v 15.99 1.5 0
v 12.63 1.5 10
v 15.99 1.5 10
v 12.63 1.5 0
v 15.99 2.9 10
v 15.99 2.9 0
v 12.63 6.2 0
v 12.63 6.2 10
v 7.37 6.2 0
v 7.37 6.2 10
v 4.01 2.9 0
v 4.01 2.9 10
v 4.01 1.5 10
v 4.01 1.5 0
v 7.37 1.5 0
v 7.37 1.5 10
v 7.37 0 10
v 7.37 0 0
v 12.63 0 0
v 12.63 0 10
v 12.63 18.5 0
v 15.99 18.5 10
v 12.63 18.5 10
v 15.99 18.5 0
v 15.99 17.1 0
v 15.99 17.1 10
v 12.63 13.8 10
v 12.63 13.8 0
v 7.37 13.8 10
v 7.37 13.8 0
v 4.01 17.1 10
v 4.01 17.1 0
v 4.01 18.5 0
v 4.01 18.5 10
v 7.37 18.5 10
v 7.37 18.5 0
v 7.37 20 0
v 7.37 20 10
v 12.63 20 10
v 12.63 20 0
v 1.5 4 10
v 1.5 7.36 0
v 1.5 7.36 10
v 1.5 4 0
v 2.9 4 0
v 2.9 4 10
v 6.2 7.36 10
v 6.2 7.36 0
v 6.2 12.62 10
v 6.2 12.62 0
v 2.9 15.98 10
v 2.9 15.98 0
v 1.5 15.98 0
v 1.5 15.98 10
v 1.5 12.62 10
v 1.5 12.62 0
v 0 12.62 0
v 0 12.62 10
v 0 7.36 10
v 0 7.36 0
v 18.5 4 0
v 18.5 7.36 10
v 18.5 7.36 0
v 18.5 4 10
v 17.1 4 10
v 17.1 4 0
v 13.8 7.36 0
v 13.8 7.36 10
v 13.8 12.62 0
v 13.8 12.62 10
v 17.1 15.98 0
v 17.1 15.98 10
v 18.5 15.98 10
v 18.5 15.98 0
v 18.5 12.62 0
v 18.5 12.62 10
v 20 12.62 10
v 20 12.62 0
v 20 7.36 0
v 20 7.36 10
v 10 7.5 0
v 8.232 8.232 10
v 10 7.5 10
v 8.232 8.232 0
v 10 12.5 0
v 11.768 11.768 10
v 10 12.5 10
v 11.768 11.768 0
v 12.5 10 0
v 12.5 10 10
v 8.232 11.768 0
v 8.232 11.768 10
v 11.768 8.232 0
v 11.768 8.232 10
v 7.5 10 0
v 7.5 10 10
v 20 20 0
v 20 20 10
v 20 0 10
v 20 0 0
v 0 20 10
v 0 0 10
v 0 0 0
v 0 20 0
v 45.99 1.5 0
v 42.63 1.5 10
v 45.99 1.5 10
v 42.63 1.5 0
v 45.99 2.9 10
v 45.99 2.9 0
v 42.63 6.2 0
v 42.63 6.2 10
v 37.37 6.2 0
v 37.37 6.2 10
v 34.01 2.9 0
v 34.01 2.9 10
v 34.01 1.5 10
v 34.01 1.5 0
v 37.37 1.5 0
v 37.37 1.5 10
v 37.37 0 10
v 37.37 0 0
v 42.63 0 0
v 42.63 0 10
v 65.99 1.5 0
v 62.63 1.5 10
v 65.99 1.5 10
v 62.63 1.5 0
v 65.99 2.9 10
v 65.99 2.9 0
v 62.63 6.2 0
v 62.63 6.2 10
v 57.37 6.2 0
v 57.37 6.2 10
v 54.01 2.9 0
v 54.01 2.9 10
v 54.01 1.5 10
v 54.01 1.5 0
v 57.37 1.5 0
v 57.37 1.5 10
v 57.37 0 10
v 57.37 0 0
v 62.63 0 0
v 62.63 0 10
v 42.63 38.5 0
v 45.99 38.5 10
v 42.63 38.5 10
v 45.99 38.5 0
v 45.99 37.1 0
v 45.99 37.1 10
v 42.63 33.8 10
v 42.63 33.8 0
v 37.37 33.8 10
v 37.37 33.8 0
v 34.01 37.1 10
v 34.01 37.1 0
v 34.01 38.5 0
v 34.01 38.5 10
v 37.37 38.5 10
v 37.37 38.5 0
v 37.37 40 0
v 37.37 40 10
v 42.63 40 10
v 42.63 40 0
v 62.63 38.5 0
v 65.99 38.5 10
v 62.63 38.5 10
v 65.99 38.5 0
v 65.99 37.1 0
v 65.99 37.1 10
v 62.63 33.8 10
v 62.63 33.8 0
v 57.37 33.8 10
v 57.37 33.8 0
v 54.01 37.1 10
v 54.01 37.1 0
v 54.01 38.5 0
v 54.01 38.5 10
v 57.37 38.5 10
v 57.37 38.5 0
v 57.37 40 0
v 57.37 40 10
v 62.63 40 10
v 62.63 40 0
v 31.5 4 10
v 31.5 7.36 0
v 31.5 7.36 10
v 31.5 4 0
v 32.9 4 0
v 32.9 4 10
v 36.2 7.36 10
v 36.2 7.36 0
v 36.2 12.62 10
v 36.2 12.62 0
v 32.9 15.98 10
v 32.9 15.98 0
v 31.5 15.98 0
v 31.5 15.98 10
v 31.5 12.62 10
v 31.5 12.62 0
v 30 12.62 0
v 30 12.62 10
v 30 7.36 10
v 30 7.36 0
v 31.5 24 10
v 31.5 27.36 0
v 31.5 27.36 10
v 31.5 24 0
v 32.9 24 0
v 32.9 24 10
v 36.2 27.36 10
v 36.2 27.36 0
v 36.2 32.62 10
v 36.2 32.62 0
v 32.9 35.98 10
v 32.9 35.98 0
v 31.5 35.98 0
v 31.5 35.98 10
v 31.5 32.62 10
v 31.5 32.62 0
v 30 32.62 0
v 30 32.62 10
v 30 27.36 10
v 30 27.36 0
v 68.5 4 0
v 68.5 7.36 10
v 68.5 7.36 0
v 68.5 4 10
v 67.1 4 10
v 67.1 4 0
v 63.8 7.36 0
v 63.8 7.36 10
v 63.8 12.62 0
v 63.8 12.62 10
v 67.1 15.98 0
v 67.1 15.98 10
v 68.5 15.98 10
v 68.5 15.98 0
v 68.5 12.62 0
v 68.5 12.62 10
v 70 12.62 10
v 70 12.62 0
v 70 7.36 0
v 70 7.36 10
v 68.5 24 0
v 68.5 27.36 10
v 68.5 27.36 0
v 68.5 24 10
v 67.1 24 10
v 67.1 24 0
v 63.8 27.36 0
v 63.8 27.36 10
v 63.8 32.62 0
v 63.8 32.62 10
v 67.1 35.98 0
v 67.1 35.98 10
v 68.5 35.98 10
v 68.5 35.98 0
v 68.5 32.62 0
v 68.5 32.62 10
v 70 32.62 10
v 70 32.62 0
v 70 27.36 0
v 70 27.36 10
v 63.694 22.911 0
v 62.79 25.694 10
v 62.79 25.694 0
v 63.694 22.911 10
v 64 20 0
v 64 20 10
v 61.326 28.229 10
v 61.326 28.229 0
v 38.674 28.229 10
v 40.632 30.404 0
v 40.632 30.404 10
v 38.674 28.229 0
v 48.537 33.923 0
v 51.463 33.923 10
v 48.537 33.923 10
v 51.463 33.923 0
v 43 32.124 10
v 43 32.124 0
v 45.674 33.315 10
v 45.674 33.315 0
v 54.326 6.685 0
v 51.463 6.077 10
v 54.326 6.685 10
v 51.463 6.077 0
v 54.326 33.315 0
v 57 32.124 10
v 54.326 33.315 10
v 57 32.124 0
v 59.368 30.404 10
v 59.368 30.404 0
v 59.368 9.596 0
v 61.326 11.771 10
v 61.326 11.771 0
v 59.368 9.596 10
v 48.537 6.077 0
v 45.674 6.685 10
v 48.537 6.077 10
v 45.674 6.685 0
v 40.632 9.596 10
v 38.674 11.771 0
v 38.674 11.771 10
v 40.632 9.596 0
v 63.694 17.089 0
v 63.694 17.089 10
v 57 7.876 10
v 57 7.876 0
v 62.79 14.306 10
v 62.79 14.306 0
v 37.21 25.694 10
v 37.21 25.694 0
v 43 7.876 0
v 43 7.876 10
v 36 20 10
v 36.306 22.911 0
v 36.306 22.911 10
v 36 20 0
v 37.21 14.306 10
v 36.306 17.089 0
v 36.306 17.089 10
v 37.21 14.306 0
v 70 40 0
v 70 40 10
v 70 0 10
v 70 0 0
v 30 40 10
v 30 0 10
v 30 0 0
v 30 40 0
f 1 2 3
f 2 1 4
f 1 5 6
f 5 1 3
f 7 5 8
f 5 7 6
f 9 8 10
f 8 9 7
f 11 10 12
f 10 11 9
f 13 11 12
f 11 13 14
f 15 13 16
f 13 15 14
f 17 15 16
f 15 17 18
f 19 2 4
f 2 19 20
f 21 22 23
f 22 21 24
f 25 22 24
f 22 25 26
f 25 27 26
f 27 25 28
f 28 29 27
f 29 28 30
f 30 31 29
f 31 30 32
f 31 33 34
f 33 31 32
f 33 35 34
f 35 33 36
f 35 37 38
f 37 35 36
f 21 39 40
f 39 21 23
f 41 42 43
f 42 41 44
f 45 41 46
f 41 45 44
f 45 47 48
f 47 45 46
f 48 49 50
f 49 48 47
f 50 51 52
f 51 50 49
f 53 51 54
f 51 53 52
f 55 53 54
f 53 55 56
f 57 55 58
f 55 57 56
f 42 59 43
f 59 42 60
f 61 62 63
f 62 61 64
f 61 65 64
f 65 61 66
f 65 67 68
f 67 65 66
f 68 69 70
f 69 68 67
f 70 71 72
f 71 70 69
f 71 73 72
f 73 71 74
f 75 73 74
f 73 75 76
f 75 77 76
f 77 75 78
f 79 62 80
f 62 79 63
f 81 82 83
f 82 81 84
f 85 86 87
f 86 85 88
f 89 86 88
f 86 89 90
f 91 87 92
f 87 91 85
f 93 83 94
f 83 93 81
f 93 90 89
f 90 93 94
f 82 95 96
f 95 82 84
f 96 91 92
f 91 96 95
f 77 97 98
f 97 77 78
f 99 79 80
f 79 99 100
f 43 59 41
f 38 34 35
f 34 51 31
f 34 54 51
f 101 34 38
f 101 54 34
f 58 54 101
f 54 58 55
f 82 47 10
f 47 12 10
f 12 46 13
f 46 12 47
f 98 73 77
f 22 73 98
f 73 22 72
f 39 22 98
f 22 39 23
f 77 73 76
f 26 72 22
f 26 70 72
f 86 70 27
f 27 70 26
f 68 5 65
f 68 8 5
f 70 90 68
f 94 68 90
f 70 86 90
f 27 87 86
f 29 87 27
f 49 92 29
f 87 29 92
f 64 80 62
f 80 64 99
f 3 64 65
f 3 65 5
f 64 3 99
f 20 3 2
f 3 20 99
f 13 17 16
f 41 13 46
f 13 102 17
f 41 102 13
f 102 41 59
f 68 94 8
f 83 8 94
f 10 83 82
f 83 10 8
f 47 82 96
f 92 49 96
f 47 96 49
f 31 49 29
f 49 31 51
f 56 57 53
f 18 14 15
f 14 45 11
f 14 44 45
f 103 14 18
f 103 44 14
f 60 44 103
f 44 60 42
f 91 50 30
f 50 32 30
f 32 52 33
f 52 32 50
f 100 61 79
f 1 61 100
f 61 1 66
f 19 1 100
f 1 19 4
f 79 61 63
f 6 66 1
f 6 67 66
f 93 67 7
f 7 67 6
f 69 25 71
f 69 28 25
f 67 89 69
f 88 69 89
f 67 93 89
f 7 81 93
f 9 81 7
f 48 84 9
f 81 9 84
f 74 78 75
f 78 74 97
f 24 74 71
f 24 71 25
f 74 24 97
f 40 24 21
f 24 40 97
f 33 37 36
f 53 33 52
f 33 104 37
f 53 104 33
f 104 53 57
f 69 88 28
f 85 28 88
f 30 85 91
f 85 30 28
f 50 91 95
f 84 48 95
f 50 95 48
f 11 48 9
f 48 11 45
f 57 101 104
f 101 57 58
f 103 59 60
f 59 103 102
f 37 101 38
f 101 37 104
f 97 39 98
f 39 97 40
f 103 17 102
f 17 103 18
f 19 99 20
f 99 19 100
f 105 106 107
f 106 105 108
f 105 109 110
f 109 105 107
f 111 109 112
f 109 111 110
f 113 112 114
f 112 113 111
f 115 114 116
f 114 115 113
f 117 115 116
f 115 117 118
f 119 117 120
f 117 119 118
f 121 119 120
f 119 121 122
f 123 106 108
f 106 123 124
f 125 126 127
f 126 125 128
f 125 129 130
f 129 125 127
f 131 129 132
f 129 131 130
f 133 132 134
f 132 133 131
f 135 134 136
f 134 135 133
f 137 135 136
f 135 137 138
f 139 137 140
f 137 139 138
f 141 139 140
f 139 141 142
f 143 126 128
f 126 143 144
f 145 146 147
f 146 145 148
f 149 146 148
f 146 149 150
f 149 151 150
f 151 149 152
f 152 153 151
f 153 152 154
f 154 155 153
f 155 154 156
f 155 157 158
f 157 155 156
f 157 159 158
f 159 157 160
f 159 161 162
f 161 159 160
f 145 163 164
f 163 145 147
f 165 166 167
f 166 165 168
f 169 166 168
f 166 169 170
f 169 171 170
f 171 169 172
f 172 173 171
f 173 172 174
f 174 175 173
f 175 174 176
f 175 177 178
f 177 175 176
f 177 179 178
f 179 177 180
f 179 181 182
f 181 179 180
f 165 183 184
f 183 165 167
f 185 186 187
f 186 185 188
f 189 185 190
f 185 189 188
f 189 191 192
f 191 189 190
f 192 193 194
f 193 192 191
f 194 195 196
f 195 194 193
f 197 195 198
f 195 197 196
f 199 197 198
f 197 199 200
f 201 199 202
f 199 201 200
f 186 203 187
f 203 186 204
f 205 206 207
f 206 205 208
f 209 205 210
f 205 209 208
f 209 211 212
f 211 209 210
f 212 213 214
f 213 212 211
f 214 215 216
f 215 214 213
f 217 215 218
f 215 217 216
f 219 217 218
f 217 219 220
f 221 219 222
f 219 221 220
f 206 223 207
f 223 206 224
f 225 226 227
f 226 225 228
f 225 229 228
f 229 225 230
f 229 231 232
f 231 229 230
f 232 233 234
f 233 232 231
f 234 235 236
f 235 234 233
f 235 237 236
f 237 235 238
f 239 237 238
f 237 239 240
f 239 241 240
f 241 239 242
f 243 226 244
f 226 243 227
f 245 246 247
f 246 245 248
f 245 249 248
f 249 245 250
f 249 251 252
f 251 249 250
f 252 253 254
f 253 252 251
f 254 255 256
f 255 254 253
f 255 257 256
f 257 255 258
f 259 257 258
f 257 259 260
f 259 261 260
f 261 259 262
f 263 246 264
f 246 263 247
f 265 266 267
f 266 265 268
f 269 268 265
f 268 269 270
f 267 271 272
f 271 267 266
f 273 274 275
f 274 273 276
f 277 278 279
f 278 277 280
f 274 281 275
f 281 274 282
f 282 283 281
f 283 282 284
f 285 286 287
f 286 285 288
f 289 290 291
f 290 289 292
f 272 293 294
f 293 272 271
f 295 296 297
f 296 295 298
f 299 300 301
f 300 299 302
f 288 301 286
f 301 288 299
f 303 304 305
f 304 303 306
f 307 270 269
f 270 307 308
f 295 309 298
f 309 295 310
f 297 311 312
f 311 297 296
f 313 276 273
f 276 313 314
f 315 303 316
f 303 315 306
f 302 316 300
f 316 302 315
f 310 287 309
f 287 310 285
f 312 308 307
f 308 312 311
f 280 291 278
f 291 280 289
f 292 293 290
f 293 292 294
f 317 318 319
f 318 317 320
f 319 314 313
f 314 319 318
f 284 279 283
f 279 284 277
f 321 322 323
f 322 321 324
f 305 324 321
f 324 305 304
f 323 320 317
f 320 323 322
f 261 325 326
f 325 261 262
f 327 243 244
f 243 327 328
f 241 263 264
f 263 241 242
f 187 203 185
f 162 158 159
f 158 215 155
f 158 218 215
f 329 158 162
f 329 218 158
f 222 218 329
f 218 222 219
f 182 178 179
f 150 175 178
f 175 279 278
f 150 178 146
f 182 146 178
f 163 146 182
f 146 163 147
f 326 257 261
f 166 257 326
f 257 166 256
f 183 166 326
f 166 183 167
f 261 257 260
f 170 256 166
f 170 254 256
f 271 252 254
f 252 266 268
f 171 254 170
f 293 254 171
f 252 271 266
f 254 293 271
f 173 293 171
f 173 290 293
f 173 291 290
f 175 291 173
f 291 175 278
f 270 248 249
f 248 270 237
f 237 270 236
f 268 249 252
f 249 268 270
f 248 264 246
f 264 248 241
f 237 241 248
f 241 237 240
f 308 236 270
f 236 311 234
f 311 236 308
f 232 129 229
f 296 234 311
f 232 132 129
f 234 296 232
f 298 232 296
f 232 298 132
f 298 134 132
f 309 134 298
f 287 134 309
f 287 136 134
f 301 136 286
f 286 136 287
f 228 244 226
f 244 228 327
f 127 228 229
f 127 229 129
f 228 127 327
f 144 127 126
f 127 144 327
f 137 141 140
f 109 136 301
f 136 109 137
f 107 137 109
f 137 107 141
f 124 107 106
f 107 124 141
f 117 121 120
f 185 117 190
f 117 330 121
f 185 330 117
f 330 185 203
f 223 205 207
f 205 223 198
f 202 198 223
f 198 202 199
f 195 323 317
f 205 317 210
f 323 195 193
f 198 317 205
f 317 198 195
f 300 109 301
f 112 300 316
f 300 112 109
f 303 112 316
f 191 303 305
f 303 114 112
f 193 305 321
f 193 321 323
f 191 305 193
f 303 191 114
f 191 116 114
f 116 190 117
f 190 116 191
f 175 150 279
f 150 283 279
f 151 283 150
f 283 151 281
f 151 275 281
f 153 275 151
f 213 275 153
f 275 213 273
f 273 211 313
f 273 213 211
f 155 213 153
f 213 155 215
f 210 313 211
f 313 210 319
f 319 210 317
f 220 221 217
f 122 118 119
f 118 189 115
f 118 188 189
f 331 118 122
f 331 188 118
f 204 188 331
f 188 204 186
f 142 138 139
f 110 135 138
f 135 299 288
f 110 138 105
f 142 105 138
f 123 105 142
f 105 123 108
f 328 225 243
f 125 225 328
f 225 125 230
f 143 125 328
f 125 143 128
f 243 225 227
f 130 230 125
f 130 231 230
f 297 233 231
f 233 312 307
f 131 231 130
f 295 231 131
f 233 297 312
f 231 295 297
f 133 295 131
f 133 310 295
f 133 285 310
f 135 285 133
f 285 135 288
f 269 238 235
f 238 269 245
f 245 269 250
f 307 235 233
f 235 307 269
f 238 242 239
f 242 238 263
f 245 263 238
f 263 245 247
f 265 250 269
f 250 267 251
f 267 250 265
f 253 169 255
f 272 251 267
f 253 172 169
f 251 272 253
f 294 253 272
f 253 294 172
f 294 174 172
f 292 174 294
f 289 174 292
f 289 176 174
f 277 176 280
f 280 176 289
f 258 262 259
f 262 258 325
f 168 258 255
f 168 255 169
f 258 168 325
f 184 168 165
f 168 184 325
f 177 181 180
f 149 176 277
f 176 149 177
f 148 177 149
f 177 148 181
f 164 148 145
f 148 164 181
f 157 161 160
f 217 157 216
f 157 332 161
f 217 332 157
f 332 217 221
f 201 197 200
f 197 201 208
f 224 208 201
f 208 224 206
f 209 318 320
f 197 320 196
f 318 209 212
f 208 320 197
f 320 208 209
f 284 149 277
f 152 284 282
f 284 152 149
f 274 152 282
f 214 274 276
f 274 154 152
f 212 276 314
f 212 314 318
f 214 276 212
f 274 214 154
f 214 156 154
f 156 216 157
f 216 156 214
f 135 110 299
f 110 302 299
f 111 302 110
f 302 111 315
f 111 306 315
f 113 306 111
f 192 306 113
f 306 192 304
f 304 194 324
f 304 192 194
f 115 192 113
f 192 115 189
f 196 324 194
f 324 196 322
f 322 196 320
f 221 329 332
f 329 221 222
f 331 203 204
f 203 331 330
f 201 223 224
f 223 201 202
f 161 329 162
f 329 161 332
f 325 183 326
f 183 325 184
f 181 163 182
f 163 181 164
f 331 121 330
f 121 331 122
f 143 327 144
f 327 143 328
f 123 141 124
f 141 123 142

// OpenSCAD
//
// Models for T-Slotted aluminum extrusion parts from 80-20.
//
// Note that the pattern for the extrusions are approximate.  The envelope is the
// the correct size and the T-slots are correctly places, but the T-slot profile
// is just to give an idea of the location.  Should more accuracy be needed, it
// can be improved.
//

module T_20_slot(height)
{
    translate([0, 0, -0.01]) linear_extrude(height=height + 0.02)
    polygon(points=[[0, -0.01], [0, 1.5], [-3.36, 1.5], [-3.36, 2.9], [0, 6.2],
        [5.26, 6.2], [5.26+3.36, 2.9], [5.26+3.36, 1.5], [5.26, 1.5], [5.26, -0.01]]);
}


module T_20_2020(height)
{
    echo("Part 20-2020 with length ", height);
    difference()
    {
        union()
        {
            cube([20, 20, height]);
        }
        union()
        {
            translate([7.37, 0, 0]) T_20_slot(height);
            translate([7.37, 20, 0]) scale([1, -1, 1]) T_20_slot(height);
            translate([0, 7.37+5.25, 0]) rotate([0, 0, -90]) T_20_slot(height);
            translate([20, 7.37+5.25, 0]) rotate([0, 0, -90]) scale([1, -1, 1]) T_20_slot(height);
            translate([10, 10, -0.01]) cylinder(r1=2.5, r2=2.5, h=height+0.02);
        }
    }
}


module T_20_2040(height)
{
    echo("Part 20-2040 with length ", height);
    difference()
    {
        union()
        {
            cube([20, 40, height]);
        }
        union()
        {
            translate([7.37, 0, 0]) T_20_slot(height);
            translate([7.37, 40, 0]) scale([1, -1, 1]) T_20_slot(height);
            translate([0, 7.37+5.25, 0]) rotate([0, 0, -90]) T_20_slot(height);
            translate([0, 27.37+5.25, 0]) rotate([0, 0, -90]) T_20_slot(height);
            translate([20, 7.37+5.25, 0]) rotate([0, 0, -90]) scale([1, -1, 1]) T_20_slot(height);
            translate([20, 27.37+5.25, 0]) rotate([0, 0, -90]) scale([1, -1, 1]) T_20_slot(height);
        }
    }
}

module T_20_4040(height)
{
    echo("Part 20-4040 with length ", height);
    difference()
    {
        union()
        {
            cube([40, 40, height]);
//            translate([20, 20, 10.01]) cylinder(r1=10, r2=10, height=height+0.02);
        }
        union()
        {
            translate([7.37, 0, 0]) T_20_slot(height);
            translate([27.37, 0, 0]) T_20_slot(height);
            translate([7.37, 40, 0]) scale([1, -1, 1]) T_20_slot(height);
            translate([27.37, 40, 0]) scale([1, -1, 1]) T_20_slot(height);
            translate([0, 7.37+5.25, 0]) rotate([0, 0, -90]) T_20_slot(height);
            translate([0, 27.37+5.25, 0]) rotate([0, 0, -90]) T_20_slot(height);
            translate([40, 7.37+5.25, 0]) rotate([0, 0, -90]) scale([1, -1, 1]) T_20_slot(height);
            translate([40, 27.37+5.25, 0]) rotate([0, 0, -90]) scale([1, -1, 1]) T_20_slot(height);
            translate([20, 20, -0.01]) cylinder(r1=14, r2=14, h=height+0.02);
        }
    }
}

//
// Connecting plates.
//
module T_20_4165()
{
    hole = 5.56/2;
    difference()
    {
        cube([80, 40, 4]);
        union()
        {
            translate([10, 10, -0.1]) cylinder(r=hole, h=4.5);
            translate([30, 10, -0.1]) cylinder(r=hole, h=4.5);
            translate([50, 10, -0.1]) cylinder(r=hole, h=4.5);
            translate([70, 10, -0.1]) cylinder(r=hole, h=4.5);
            translate([10, 30, -0.1]) cylinder(r=hole, h=4.5);
            translate([30, 30, -0.1]) cylinder(r=hole, h=4.5);
            translate([50, 30, -0.1]) cylinder(r=hole, h=4.5);
            translate([70, 30, -0.1]) cylinder(r=hole, h=4.5);
        }
    }
}

module T_20_4113()
{
    hole = 5.56/2;
    difference()
    {
        union()
        {
            translate([0, 1, 0]) cube([20, 38,  3]);
            translate([0, 1, 0]) cube([ 3, 38, 20]);
        }
        union()
        {
            translate([10, 10, -0.1]) cylinder(r=hole, h=3.5);
            translate([10, 30, -0.1]) cylinder(r=hole, h=3.5);
            translate([-0.1, 10, 10]) rotate([0, 90, 0]) cylinder(r=hole, h=3.5);
            translate([-0.1, 30, 10]) rotate([0, 90, 0]) cylinder(r=hole, h=3.5);
        }
    }
}

module T_20_4119()
{
    hole = 5.56/2;
    difference()
    {
        union()
        {
            translate([0, 1, 0]) cube([20, 18,  3]);
            translate([0, 1, 0]) cube([ 3, 18, 20]);
        }
        union()
        {
            translate([10, 10, -0.1]) cylinder(r=hole, h=3.5);
            translate([-0.1, 10, 10]) rotate([0, 90, 0]) cylinder(r=hole, h=3.5);
        }
    }
}

T_20_2020(10);
translate([30, 0, 0]) T_20_4040(10);
